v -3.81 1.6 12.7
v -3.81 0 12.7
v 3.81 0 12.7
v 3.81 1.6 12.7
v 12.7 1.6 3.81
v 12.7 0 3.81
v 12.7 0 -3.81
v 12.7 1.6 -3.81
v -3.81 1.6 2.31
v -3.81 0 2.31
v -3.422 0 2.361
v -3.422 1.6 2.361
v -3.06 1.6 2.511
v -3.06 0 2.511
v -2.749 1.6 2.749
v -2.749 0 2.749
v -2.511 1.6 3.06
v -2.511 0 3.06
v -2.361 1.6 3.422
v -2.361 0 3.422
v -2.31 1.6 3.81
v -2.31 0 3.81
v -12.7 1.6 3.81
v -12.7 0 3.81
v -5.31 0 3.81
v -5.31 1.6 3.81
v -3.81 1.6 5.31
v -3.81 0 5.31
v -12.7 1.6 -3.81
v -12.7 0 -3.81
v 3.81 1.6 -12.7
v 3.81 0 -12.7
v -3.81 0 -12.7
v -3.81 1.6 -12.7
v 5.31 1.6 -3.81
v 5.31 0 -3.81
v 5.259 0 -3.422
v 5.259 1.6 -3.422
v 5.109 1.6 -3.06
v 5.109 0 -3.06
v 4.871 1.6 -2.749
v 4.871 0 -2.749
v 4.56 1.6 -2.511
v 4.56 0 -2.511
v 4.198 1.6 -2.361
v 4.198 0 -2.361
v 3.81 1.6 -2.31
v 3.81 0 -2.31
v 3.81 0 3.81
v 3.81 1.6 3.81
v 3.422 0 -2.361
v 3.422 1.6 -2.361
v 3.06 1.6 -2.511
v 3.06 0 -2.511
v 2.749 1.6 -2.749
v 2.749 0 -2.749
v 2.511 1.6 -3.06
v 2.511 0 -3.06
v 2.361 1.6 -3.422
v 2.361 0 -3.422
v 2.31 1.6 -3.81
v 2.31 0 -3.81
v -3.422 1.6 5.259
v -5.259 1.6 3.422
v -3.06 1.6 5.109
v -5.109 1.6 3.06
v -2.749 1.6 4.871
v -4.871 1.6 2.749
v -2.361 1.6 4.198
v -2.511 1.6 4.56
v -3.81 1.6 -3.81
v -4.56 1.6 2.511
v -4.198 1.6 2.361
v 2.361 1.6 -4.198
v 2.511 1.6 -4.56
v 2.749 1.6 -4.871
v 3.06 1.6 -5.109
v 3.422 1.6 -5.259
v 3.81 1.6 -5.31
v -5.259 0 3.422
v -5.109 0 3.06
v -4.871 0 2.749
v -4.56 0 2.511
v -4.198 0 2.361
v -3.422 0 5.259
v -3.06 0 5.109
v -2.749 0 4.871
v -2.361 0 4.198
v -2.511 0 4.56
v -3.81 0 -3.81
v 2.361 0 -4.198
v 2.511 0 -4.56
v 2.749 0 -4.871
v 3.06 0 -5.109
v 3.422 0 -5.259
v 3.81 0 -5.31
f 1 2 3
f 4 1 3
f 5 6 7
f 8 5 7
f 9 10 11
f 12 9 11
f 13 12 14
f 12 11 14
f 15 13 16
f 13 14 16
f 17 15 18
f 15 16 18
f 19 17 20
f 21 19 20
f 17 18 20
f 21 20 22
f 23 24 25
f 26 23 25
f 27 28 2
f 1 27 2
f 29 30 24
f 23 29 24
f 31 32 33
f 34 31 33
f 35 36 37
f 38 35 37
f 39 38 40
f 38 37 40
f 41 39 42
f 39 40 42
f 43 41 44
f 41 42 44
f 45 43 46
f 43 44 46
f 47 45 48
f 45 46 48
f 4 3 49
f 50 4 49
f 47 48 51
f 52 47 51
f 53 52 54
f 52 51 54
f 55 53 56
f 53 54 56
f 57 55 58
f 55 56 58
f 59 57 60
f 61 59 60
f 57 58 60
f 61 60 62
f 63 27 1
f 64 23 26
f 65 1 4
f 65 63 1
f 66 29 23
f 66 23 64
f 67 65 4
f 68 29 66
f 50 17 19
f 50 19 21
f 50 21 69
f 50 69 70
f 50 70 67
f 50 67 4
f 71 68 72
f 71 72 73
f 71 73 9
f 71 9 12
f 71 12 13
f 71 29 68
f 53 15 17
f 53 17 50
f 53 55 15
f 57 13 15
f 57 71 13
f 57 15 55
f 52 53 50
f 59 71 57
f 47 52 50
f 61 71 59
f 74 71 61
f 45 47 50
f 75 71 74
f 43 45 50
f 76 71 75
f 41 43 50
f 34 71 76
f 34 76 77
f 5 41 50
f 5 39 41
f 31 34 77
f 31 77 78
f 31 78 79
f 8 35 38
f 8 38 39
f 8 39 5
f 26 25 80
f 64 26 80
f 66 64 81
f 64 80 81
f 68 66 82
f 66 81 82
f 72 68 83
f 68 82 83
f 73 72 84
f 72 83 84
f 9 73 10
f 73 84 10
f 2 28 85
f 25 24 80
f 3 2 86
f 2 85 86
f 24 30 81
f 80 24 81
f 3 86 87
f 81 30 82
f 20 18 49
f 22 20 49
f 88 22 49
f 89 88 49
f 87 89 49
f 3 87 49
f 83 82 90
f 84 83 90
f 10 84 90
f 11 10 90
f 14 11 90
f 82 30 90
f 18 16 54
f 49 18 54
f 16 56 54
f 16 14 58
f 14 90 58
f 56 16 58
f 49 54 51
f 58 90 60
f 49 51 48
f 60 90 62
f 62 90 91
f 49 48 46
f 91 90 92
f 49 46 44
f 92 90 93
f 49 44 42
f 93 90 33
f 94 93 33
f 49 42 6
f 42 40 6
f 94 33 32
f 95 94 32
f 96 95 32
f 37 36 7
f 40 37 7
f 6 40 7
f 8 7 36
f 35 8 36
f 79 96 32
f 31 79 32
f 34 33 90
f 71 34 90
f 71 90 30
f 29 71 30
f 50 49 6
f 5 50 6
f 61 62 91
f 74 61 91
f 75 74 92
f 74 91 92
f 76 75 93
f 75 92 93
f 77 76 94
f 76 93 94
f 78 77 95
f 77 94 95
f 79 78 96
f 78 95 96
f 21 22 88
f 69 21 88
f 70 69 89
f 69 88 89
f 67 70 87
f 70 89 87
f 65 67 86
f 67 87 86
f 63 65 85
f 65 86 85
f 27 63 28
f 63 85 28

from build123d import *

# Parameters (mm, degrees)
BOSS_EXTRUDE1_DEPTH = 1.6


with BuildPart() as part:
    # Sketch1 → Boss-Extrude1 (new body)
    with BuildSketch(Plane(origin=(0, 0, 0), x_dir=(1, 0, 0), z_dir=(0, 1, 0))):
        with BuildLine():
            Line((-12.7, -3.81), (-5.31, -3.81))
            ThreePointArc((-5.31, -3.81), (-4.870660172, -2.749339828), (-3.81, -2.31))
            Line((-3.81, -2.31), (-3.81, 3.81))
            Line((-3.81, 3.81), (-12.7, 3.81))
            Line((-12.7, 3.81), (-12.7, -3.81))
        make_face()
        with BuildLine():
            Line((-2.31, -3.81), (3.81, -3.81))
            Line((3.81, -3.81), (3.81, 2.31))
            ThreePointArc((3.81, 2.31), (2.749339828, 2.749339828), (2.31, 3.81))
            Line((2.31, 3.81), (-3.81, 3.81))
            Line((-3.81, 3.81), (-3.81, -2.31))
            ThreePointArc((-3.81, -2.31), (-2.749339828, -2.749339828), (-2.31, -3.81))
        make_face()
        with BuildLine():
            Line((-3.81, -12.7), (3.81, -12.7))
            Line((3.81, -12.7), (3.81, -3.81))
            Line((3.81, -3.81), (-2.31, -3.81))
            ThreePointArc((-2.31, -3.81), (-2.749339828, -4.870660172), (-3.81, -5.31))
            Line((-3.81, -5.31), (-3.81, -12.7))
        make_face()
        with BuildLine():
            Line((3.81, 2.31), (3.81, -3.81))
            Line((3.81, -3.81), (12.7, -3.81))
            Line((12.7, -3.81), (12.7, 3.81))
            Line((12.7, 3.81), (5.31, 3.81))
            ThreePointArc((5.31, 3.81), (4.870660172, 2.749339828), (3.81, 2.31))
        make_face()
        with BuildLine():
            Line((-3.81, 3.81), (2.31, 3.81))
            ThreePointArc((2.31, 3.81), (2.749339828, 4.870660172), (3.81, 5.31))
            Line((3.81, 5.31), (3.81, 12.7))
            Line((3.81, 12.7), (-3.81, 12.7))
            Line((-3.81, 12.7), (-3.81, 3.81))
        make_face()
    extrude(amount=BOSS_EXTRUDE1_DEPTH)


solid = part.part
